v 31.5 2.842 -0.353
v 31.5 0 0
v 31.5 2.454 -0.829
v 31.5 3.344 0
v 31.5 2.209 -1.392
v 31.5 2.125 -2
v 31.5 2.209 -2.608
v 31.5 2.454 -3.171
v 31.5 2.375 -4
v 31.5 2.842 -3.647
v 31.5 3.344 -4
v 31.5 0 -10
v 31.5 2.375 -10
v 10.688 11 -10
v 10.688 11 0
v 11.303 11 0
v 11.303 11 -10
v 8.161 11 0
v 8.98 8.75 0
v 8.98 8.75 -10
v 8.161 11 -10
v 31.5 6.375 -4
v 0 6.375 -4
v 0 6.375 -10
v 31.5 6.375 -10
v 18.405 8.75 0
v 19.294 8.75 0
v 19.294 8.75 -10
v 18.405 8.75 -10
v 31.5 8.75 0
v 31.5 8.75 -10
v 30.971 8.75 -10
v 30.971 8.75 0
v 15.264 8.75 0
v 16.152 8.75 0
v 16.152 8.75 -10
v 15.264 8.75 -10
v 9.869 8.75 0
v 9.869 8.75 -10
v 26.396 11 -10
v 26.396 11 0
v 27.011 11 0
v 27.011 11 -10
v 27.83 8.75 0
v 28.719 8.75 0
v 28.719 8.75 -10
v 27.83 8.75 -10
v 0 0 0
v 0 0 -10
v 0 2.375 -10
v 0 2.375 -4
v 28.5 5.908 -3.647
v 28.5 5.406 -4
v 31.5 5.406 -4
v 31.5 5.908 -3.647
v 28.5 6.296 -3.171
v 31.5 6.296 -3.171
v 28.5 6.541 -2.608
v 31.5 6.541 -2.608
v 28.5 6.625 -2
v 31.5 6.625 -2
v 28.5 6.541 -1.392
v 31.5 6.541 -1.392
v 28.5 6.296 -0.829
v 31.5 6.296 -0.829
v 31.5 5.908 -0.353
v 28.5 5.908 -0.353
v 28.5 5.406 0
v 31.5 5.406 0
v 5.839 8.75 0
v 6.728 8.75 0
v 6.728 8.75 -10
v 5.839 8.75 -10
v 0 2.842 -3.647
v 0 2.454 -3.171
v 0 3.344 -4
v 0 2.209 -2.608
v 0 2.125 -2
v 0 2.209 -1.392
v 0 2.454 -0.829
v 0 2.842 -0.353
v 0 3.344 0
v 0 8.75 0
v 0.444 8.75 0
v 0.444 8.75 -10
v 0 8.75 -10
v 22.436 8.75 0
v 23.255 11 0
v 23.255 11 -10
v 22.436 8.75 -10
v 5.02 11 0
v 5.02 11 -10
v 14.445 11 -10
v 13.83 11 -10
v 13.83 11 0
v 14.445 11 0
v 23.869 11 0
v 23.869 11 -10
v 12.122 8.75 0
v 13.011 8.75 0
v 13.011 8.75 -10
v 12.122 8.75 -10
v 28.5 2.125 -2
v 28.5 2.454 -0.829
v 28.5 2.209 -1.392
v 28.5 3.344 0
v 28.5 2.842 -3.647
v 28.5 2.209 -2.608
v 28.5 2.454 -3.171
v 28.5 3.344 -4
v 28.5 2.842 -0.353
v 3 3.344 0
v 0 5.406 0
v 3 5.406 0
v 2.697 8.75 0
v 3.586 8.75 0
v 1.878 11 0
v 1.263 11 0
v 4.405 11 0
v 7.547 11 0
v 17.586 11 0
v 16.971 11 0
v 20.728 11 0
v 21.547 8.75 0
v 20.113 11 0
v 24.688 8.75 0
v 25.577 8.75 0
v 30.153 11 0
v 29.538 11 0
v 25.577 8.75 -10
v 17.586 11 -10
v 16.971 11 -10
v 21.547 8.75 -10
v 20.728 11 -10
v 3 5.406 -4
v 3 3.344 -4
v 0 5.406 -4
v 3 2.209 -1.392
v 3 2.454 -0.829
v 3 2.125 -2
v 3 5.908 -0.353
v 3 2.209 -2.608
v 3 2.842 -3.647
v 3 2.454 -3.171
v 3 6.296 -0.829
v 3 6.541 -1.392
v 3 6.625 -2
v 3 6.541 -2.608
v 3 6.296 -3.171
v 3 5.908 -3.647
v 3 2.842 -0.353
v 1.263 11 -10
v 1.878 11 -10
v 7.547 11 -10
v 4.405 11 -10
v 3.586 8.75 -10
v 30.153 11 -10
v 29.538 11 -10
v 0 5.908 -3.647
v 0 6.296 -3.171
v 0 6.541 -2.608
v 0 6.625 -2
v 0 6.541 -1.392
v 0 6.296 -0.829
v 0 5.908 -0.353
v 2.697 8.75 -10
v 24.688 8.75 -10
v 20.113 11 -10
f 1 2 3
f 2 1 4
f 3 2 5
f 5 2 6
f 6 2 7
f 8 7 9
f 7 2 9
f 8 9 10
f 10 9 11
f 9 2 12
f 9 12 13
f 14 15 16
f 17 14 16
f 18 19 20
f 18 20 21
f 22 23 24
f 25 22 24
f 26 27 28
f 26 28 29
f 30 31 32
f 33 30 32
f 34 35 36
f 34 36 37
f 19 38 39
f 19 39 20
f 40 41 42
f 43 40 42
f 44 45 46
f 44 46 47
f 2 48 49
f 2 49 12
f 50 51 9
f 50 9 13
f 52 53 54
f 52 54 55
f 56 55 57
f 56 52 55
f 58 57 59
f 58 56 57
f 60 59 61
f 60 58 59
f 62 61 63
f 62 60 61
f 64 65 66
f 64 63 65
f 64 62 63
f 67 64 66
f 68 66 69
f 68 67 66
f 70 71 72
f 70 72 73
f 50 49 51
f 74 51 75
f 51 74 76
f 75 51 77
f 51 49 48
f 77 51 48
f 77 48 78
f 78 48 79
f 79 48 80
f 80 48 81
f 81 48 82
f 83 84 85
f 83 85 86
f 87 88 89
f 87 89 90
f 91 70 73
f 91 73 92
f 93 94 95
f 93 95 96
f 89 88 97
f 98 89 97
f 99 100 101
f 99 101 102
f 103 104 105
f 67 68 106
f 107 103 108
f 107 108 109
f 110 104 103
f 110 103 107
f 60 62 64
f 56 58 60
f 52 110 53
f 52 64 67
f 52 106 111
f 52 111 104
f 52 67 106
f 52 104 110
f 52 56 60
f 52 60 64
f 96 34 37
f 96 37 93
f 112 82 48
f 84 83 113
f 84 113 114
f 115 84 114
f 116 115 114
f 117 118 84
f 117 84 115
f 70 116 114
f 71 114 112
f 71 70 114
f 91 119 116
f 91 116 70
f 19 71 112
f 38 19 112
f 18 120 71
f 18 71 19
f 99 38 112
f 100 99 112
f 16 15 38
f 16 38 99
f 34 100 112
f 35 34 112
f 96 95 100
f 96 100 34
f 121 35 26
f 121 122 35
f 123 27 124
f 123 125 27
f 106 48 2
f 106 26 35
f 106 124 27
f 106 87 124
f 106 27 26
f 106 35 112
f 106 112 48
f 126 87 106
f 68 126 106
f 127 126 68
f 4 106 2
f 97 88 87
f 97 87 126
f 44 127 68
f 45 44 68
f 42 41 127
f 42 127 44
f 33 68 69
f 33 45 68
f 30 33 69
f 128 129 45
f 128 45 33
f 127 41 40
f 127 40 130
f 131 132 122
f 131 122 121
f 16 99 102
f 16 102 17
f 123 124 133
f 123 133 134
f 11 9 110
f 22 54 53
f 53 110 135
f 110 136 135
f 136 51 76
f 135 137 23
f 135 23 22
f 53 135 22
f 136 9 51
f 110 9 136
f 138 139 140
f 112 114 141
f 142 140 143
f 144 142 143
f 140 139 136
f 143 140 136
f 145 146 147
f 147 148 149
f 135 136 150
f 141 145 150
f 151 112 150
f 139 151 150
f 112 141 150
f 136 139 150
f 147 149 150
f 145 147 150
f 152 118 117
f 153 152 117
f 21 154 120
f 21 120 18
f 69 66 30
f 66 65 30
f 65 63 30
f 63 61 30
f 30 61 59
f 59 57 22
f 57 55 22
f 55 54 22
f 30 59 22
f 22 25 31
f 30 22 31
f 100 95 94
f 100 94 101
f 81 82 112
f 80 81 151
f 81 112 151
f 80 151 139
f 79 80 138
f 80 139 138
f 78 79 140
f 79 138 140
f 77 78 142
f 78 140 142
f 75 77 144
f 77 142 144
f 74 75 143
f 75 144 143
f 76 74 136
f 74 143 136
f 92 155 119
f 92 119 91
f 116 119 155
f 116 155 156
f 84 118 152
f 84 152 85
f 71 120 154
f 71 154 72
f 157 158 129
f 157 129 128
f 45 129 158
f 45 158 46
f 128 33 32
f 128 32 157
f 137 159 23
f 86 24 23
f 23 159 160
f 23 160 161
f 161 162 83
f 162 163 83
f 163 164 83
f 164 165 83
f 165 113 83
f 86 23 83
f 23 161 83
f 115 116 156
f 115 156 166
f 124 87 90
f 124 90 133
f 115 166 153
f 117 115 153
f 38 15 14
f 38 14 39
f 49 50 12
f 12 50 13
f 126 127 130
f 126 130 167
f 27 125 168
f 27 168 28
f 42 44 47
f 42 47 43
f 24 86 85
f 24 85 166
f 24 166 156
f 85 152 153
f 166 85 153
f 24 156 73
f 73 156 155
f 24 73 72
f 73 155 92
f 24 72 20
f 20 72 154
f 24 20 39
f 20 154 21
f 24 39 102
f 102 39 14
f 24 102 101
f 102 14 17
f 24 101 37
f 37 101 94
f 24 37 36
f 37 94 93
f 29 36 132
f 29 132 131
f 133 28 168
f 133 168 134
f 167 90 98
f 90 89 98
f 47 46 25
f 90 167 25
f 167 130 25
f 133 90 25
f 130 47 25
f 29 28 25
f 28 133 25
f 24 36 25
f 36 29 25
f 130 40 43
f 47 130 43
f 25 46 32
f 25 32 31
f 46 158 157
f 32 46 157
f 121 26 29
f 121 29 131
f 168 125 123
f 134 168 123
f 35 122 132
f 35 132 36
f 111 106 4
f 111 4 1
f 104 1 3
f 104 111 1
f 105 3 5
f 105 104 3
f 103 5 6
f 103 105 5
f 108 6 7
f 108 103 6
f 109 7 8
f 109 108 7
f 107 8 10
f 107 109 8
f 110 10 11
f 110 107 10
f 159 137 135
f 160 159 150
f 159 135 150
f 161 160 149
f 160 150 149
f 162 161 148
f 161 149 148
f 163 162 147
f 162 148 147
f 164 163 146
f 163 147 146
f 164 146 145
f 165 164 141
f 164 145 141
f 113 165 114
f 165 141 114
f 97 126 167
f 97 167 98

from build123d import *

# Parameters (mm, degrees)
BLANKSKE_W              = 800
BLANKSKE_H              = 11
BLANK_DEPTH             = 10
TOOTHCUTSIM_DEPTH       = 801.138113078
TEETHCUTS_COUNT         = 255
TEETHCUTS_PITCH         = 3.14159265
CUT_EXTRUDE1_DEPTH      = 801.138113078
CUT_EXTRUDE1_DEPTH_BACK = 801.138113078
SKETCH1_W               = 6
SKETCH1_H               = 4
CUT_EXTRUDE2_DEPTH      = 801.138113078
CUT_EXTRUDE2_DEPTH_BACK = 801.138113078
SKETCH3_OUTSIDE_W       = 962.028
SKETCH3_OUTSIDE_H       = 173.028
SKETCH3_OUTSIDE_W_2     = 31.5
SKETCH3_OUTSIDE_H_2     = 25.836038267
CUT_EXTRUDE3_DEPTH      = 35.8317384
CUT_EXTRUDE3_DEPTH_BACK = 3
SKETCH4_R               = 2.25
CUT_EXTRUDE4_START      = -28.5
SKETCH4_2_R             = 2.25
CUT_EXTRUDE4_DEPTH      = 3


with BuildPart() as part:
    # BlankSke → Blank (new body)
    with BuildSketch(Plane.XY):
        with Locations((400, 5.5)):
            Rectangle(BLANKSKE_W, BLANKSKE_H)
    extrude(amount=-BLANK_DEPTH)

    # TooCutSkeSim → ToothCutSim (cut, through all)
    with BuildSketch(Plane.XY):
        Polygon((0.44443537, 8.75), (-0.44443537, 8.75), (-1.272613241, 11.0254), (1.272613241, 11.0254), align=None)
    toothcutsim = extrude(amount=-TOOTHCUTSIM_DEPTH, mode=Mode.SUBTRACT)

    # TeethCuts: ToothCutSim ×255
    with Locations(*[(i * TEETHCUTS_PITCH, 0, 0) for i in range(1, TEETHCUTS_COUNT)]):
        add(toothcutsim, mode=Mode.SUBTRACT)

    # Sketch1 → Cut-Extrude1 (cut, two sides: drawn at the far end of the back side and taken through both)
    with BuildSketch(Plane(origin=(800, 0, 0), x_dir=(0, 0, -1), z_dir=(1, 0, 0)).offset(-CUT_EXTRUDE1_DEPTH_BACK)):
        with Locations((7, 4.375)):
            Rectangle(SKETCH1_W, SKETCH1_H)
    extrude(amount=CUT_EXTRUDE1_DEPTH + CUT_EXTRUDE1_DEPTH_BACK, mode=Mode.SUBTRACT)

    # Sketch3 outside → Cut-Extrude2 (cut, two sides: drawn at the far end of the back side and taken through both)
    with BuildSketch(Plane.XY.offset(-CUT_EXTRUDE2_DEPTH_BACK)):
        with Locations((400, 5.5)):
            Rectangle(SKETCH3_OUTSIDE_W, SKETCH3_OUTSIDE_H)
        with Locations((15.75, 12.918019134)):
            Rectangle(SKETCH3_OUTSIDE_W_2, SKETCH3_OUTSIDE_H_2, mode=Mode.SUBTRACT)
    extrude(amount=CUT_EXTRUDE2_DEPTH + CUT_EXTRUDE2_DEPTH_BACK, mode=Mode.SUBTRACT)

    # Sketch4 → Cut-Extrude3 (cut, two sides: drawn at the far end of the back side and taken through both)
    with BuildSketch(Plane(origin=(31.5, 0, 0), x_dir=(0, 0, -1), z_dir=(1, 0, 0)).offset(-CUT_EXTRUDE3_DEPTH_BACK)):
        with Locations((2, 4.375)):
            Circle(SKETCH4_R)
    extrude(amount=CUT_EXTRUDE3_DEPTH + CUT_EXTRUDE3_DEPTH_BACK, mode=Mode.SUBTRACT)

    # Sketch4<2> → Cut-Extrude4 (cut)
    with BuildSketch(Plane(origin=(31.5, 0, 0), x_dir=(0, 0, -1), z_dir=(1, 0, 0)).offset(CUT_EXTRUDE4_START)):
        with Locations((2, 4.375)):
            Circle(SKETCH4_2_R)
    extrude(amount=-CUT_EXTRUDE4_DEPTH, mode=Mode.SUBTRACT)


solid = part.part
